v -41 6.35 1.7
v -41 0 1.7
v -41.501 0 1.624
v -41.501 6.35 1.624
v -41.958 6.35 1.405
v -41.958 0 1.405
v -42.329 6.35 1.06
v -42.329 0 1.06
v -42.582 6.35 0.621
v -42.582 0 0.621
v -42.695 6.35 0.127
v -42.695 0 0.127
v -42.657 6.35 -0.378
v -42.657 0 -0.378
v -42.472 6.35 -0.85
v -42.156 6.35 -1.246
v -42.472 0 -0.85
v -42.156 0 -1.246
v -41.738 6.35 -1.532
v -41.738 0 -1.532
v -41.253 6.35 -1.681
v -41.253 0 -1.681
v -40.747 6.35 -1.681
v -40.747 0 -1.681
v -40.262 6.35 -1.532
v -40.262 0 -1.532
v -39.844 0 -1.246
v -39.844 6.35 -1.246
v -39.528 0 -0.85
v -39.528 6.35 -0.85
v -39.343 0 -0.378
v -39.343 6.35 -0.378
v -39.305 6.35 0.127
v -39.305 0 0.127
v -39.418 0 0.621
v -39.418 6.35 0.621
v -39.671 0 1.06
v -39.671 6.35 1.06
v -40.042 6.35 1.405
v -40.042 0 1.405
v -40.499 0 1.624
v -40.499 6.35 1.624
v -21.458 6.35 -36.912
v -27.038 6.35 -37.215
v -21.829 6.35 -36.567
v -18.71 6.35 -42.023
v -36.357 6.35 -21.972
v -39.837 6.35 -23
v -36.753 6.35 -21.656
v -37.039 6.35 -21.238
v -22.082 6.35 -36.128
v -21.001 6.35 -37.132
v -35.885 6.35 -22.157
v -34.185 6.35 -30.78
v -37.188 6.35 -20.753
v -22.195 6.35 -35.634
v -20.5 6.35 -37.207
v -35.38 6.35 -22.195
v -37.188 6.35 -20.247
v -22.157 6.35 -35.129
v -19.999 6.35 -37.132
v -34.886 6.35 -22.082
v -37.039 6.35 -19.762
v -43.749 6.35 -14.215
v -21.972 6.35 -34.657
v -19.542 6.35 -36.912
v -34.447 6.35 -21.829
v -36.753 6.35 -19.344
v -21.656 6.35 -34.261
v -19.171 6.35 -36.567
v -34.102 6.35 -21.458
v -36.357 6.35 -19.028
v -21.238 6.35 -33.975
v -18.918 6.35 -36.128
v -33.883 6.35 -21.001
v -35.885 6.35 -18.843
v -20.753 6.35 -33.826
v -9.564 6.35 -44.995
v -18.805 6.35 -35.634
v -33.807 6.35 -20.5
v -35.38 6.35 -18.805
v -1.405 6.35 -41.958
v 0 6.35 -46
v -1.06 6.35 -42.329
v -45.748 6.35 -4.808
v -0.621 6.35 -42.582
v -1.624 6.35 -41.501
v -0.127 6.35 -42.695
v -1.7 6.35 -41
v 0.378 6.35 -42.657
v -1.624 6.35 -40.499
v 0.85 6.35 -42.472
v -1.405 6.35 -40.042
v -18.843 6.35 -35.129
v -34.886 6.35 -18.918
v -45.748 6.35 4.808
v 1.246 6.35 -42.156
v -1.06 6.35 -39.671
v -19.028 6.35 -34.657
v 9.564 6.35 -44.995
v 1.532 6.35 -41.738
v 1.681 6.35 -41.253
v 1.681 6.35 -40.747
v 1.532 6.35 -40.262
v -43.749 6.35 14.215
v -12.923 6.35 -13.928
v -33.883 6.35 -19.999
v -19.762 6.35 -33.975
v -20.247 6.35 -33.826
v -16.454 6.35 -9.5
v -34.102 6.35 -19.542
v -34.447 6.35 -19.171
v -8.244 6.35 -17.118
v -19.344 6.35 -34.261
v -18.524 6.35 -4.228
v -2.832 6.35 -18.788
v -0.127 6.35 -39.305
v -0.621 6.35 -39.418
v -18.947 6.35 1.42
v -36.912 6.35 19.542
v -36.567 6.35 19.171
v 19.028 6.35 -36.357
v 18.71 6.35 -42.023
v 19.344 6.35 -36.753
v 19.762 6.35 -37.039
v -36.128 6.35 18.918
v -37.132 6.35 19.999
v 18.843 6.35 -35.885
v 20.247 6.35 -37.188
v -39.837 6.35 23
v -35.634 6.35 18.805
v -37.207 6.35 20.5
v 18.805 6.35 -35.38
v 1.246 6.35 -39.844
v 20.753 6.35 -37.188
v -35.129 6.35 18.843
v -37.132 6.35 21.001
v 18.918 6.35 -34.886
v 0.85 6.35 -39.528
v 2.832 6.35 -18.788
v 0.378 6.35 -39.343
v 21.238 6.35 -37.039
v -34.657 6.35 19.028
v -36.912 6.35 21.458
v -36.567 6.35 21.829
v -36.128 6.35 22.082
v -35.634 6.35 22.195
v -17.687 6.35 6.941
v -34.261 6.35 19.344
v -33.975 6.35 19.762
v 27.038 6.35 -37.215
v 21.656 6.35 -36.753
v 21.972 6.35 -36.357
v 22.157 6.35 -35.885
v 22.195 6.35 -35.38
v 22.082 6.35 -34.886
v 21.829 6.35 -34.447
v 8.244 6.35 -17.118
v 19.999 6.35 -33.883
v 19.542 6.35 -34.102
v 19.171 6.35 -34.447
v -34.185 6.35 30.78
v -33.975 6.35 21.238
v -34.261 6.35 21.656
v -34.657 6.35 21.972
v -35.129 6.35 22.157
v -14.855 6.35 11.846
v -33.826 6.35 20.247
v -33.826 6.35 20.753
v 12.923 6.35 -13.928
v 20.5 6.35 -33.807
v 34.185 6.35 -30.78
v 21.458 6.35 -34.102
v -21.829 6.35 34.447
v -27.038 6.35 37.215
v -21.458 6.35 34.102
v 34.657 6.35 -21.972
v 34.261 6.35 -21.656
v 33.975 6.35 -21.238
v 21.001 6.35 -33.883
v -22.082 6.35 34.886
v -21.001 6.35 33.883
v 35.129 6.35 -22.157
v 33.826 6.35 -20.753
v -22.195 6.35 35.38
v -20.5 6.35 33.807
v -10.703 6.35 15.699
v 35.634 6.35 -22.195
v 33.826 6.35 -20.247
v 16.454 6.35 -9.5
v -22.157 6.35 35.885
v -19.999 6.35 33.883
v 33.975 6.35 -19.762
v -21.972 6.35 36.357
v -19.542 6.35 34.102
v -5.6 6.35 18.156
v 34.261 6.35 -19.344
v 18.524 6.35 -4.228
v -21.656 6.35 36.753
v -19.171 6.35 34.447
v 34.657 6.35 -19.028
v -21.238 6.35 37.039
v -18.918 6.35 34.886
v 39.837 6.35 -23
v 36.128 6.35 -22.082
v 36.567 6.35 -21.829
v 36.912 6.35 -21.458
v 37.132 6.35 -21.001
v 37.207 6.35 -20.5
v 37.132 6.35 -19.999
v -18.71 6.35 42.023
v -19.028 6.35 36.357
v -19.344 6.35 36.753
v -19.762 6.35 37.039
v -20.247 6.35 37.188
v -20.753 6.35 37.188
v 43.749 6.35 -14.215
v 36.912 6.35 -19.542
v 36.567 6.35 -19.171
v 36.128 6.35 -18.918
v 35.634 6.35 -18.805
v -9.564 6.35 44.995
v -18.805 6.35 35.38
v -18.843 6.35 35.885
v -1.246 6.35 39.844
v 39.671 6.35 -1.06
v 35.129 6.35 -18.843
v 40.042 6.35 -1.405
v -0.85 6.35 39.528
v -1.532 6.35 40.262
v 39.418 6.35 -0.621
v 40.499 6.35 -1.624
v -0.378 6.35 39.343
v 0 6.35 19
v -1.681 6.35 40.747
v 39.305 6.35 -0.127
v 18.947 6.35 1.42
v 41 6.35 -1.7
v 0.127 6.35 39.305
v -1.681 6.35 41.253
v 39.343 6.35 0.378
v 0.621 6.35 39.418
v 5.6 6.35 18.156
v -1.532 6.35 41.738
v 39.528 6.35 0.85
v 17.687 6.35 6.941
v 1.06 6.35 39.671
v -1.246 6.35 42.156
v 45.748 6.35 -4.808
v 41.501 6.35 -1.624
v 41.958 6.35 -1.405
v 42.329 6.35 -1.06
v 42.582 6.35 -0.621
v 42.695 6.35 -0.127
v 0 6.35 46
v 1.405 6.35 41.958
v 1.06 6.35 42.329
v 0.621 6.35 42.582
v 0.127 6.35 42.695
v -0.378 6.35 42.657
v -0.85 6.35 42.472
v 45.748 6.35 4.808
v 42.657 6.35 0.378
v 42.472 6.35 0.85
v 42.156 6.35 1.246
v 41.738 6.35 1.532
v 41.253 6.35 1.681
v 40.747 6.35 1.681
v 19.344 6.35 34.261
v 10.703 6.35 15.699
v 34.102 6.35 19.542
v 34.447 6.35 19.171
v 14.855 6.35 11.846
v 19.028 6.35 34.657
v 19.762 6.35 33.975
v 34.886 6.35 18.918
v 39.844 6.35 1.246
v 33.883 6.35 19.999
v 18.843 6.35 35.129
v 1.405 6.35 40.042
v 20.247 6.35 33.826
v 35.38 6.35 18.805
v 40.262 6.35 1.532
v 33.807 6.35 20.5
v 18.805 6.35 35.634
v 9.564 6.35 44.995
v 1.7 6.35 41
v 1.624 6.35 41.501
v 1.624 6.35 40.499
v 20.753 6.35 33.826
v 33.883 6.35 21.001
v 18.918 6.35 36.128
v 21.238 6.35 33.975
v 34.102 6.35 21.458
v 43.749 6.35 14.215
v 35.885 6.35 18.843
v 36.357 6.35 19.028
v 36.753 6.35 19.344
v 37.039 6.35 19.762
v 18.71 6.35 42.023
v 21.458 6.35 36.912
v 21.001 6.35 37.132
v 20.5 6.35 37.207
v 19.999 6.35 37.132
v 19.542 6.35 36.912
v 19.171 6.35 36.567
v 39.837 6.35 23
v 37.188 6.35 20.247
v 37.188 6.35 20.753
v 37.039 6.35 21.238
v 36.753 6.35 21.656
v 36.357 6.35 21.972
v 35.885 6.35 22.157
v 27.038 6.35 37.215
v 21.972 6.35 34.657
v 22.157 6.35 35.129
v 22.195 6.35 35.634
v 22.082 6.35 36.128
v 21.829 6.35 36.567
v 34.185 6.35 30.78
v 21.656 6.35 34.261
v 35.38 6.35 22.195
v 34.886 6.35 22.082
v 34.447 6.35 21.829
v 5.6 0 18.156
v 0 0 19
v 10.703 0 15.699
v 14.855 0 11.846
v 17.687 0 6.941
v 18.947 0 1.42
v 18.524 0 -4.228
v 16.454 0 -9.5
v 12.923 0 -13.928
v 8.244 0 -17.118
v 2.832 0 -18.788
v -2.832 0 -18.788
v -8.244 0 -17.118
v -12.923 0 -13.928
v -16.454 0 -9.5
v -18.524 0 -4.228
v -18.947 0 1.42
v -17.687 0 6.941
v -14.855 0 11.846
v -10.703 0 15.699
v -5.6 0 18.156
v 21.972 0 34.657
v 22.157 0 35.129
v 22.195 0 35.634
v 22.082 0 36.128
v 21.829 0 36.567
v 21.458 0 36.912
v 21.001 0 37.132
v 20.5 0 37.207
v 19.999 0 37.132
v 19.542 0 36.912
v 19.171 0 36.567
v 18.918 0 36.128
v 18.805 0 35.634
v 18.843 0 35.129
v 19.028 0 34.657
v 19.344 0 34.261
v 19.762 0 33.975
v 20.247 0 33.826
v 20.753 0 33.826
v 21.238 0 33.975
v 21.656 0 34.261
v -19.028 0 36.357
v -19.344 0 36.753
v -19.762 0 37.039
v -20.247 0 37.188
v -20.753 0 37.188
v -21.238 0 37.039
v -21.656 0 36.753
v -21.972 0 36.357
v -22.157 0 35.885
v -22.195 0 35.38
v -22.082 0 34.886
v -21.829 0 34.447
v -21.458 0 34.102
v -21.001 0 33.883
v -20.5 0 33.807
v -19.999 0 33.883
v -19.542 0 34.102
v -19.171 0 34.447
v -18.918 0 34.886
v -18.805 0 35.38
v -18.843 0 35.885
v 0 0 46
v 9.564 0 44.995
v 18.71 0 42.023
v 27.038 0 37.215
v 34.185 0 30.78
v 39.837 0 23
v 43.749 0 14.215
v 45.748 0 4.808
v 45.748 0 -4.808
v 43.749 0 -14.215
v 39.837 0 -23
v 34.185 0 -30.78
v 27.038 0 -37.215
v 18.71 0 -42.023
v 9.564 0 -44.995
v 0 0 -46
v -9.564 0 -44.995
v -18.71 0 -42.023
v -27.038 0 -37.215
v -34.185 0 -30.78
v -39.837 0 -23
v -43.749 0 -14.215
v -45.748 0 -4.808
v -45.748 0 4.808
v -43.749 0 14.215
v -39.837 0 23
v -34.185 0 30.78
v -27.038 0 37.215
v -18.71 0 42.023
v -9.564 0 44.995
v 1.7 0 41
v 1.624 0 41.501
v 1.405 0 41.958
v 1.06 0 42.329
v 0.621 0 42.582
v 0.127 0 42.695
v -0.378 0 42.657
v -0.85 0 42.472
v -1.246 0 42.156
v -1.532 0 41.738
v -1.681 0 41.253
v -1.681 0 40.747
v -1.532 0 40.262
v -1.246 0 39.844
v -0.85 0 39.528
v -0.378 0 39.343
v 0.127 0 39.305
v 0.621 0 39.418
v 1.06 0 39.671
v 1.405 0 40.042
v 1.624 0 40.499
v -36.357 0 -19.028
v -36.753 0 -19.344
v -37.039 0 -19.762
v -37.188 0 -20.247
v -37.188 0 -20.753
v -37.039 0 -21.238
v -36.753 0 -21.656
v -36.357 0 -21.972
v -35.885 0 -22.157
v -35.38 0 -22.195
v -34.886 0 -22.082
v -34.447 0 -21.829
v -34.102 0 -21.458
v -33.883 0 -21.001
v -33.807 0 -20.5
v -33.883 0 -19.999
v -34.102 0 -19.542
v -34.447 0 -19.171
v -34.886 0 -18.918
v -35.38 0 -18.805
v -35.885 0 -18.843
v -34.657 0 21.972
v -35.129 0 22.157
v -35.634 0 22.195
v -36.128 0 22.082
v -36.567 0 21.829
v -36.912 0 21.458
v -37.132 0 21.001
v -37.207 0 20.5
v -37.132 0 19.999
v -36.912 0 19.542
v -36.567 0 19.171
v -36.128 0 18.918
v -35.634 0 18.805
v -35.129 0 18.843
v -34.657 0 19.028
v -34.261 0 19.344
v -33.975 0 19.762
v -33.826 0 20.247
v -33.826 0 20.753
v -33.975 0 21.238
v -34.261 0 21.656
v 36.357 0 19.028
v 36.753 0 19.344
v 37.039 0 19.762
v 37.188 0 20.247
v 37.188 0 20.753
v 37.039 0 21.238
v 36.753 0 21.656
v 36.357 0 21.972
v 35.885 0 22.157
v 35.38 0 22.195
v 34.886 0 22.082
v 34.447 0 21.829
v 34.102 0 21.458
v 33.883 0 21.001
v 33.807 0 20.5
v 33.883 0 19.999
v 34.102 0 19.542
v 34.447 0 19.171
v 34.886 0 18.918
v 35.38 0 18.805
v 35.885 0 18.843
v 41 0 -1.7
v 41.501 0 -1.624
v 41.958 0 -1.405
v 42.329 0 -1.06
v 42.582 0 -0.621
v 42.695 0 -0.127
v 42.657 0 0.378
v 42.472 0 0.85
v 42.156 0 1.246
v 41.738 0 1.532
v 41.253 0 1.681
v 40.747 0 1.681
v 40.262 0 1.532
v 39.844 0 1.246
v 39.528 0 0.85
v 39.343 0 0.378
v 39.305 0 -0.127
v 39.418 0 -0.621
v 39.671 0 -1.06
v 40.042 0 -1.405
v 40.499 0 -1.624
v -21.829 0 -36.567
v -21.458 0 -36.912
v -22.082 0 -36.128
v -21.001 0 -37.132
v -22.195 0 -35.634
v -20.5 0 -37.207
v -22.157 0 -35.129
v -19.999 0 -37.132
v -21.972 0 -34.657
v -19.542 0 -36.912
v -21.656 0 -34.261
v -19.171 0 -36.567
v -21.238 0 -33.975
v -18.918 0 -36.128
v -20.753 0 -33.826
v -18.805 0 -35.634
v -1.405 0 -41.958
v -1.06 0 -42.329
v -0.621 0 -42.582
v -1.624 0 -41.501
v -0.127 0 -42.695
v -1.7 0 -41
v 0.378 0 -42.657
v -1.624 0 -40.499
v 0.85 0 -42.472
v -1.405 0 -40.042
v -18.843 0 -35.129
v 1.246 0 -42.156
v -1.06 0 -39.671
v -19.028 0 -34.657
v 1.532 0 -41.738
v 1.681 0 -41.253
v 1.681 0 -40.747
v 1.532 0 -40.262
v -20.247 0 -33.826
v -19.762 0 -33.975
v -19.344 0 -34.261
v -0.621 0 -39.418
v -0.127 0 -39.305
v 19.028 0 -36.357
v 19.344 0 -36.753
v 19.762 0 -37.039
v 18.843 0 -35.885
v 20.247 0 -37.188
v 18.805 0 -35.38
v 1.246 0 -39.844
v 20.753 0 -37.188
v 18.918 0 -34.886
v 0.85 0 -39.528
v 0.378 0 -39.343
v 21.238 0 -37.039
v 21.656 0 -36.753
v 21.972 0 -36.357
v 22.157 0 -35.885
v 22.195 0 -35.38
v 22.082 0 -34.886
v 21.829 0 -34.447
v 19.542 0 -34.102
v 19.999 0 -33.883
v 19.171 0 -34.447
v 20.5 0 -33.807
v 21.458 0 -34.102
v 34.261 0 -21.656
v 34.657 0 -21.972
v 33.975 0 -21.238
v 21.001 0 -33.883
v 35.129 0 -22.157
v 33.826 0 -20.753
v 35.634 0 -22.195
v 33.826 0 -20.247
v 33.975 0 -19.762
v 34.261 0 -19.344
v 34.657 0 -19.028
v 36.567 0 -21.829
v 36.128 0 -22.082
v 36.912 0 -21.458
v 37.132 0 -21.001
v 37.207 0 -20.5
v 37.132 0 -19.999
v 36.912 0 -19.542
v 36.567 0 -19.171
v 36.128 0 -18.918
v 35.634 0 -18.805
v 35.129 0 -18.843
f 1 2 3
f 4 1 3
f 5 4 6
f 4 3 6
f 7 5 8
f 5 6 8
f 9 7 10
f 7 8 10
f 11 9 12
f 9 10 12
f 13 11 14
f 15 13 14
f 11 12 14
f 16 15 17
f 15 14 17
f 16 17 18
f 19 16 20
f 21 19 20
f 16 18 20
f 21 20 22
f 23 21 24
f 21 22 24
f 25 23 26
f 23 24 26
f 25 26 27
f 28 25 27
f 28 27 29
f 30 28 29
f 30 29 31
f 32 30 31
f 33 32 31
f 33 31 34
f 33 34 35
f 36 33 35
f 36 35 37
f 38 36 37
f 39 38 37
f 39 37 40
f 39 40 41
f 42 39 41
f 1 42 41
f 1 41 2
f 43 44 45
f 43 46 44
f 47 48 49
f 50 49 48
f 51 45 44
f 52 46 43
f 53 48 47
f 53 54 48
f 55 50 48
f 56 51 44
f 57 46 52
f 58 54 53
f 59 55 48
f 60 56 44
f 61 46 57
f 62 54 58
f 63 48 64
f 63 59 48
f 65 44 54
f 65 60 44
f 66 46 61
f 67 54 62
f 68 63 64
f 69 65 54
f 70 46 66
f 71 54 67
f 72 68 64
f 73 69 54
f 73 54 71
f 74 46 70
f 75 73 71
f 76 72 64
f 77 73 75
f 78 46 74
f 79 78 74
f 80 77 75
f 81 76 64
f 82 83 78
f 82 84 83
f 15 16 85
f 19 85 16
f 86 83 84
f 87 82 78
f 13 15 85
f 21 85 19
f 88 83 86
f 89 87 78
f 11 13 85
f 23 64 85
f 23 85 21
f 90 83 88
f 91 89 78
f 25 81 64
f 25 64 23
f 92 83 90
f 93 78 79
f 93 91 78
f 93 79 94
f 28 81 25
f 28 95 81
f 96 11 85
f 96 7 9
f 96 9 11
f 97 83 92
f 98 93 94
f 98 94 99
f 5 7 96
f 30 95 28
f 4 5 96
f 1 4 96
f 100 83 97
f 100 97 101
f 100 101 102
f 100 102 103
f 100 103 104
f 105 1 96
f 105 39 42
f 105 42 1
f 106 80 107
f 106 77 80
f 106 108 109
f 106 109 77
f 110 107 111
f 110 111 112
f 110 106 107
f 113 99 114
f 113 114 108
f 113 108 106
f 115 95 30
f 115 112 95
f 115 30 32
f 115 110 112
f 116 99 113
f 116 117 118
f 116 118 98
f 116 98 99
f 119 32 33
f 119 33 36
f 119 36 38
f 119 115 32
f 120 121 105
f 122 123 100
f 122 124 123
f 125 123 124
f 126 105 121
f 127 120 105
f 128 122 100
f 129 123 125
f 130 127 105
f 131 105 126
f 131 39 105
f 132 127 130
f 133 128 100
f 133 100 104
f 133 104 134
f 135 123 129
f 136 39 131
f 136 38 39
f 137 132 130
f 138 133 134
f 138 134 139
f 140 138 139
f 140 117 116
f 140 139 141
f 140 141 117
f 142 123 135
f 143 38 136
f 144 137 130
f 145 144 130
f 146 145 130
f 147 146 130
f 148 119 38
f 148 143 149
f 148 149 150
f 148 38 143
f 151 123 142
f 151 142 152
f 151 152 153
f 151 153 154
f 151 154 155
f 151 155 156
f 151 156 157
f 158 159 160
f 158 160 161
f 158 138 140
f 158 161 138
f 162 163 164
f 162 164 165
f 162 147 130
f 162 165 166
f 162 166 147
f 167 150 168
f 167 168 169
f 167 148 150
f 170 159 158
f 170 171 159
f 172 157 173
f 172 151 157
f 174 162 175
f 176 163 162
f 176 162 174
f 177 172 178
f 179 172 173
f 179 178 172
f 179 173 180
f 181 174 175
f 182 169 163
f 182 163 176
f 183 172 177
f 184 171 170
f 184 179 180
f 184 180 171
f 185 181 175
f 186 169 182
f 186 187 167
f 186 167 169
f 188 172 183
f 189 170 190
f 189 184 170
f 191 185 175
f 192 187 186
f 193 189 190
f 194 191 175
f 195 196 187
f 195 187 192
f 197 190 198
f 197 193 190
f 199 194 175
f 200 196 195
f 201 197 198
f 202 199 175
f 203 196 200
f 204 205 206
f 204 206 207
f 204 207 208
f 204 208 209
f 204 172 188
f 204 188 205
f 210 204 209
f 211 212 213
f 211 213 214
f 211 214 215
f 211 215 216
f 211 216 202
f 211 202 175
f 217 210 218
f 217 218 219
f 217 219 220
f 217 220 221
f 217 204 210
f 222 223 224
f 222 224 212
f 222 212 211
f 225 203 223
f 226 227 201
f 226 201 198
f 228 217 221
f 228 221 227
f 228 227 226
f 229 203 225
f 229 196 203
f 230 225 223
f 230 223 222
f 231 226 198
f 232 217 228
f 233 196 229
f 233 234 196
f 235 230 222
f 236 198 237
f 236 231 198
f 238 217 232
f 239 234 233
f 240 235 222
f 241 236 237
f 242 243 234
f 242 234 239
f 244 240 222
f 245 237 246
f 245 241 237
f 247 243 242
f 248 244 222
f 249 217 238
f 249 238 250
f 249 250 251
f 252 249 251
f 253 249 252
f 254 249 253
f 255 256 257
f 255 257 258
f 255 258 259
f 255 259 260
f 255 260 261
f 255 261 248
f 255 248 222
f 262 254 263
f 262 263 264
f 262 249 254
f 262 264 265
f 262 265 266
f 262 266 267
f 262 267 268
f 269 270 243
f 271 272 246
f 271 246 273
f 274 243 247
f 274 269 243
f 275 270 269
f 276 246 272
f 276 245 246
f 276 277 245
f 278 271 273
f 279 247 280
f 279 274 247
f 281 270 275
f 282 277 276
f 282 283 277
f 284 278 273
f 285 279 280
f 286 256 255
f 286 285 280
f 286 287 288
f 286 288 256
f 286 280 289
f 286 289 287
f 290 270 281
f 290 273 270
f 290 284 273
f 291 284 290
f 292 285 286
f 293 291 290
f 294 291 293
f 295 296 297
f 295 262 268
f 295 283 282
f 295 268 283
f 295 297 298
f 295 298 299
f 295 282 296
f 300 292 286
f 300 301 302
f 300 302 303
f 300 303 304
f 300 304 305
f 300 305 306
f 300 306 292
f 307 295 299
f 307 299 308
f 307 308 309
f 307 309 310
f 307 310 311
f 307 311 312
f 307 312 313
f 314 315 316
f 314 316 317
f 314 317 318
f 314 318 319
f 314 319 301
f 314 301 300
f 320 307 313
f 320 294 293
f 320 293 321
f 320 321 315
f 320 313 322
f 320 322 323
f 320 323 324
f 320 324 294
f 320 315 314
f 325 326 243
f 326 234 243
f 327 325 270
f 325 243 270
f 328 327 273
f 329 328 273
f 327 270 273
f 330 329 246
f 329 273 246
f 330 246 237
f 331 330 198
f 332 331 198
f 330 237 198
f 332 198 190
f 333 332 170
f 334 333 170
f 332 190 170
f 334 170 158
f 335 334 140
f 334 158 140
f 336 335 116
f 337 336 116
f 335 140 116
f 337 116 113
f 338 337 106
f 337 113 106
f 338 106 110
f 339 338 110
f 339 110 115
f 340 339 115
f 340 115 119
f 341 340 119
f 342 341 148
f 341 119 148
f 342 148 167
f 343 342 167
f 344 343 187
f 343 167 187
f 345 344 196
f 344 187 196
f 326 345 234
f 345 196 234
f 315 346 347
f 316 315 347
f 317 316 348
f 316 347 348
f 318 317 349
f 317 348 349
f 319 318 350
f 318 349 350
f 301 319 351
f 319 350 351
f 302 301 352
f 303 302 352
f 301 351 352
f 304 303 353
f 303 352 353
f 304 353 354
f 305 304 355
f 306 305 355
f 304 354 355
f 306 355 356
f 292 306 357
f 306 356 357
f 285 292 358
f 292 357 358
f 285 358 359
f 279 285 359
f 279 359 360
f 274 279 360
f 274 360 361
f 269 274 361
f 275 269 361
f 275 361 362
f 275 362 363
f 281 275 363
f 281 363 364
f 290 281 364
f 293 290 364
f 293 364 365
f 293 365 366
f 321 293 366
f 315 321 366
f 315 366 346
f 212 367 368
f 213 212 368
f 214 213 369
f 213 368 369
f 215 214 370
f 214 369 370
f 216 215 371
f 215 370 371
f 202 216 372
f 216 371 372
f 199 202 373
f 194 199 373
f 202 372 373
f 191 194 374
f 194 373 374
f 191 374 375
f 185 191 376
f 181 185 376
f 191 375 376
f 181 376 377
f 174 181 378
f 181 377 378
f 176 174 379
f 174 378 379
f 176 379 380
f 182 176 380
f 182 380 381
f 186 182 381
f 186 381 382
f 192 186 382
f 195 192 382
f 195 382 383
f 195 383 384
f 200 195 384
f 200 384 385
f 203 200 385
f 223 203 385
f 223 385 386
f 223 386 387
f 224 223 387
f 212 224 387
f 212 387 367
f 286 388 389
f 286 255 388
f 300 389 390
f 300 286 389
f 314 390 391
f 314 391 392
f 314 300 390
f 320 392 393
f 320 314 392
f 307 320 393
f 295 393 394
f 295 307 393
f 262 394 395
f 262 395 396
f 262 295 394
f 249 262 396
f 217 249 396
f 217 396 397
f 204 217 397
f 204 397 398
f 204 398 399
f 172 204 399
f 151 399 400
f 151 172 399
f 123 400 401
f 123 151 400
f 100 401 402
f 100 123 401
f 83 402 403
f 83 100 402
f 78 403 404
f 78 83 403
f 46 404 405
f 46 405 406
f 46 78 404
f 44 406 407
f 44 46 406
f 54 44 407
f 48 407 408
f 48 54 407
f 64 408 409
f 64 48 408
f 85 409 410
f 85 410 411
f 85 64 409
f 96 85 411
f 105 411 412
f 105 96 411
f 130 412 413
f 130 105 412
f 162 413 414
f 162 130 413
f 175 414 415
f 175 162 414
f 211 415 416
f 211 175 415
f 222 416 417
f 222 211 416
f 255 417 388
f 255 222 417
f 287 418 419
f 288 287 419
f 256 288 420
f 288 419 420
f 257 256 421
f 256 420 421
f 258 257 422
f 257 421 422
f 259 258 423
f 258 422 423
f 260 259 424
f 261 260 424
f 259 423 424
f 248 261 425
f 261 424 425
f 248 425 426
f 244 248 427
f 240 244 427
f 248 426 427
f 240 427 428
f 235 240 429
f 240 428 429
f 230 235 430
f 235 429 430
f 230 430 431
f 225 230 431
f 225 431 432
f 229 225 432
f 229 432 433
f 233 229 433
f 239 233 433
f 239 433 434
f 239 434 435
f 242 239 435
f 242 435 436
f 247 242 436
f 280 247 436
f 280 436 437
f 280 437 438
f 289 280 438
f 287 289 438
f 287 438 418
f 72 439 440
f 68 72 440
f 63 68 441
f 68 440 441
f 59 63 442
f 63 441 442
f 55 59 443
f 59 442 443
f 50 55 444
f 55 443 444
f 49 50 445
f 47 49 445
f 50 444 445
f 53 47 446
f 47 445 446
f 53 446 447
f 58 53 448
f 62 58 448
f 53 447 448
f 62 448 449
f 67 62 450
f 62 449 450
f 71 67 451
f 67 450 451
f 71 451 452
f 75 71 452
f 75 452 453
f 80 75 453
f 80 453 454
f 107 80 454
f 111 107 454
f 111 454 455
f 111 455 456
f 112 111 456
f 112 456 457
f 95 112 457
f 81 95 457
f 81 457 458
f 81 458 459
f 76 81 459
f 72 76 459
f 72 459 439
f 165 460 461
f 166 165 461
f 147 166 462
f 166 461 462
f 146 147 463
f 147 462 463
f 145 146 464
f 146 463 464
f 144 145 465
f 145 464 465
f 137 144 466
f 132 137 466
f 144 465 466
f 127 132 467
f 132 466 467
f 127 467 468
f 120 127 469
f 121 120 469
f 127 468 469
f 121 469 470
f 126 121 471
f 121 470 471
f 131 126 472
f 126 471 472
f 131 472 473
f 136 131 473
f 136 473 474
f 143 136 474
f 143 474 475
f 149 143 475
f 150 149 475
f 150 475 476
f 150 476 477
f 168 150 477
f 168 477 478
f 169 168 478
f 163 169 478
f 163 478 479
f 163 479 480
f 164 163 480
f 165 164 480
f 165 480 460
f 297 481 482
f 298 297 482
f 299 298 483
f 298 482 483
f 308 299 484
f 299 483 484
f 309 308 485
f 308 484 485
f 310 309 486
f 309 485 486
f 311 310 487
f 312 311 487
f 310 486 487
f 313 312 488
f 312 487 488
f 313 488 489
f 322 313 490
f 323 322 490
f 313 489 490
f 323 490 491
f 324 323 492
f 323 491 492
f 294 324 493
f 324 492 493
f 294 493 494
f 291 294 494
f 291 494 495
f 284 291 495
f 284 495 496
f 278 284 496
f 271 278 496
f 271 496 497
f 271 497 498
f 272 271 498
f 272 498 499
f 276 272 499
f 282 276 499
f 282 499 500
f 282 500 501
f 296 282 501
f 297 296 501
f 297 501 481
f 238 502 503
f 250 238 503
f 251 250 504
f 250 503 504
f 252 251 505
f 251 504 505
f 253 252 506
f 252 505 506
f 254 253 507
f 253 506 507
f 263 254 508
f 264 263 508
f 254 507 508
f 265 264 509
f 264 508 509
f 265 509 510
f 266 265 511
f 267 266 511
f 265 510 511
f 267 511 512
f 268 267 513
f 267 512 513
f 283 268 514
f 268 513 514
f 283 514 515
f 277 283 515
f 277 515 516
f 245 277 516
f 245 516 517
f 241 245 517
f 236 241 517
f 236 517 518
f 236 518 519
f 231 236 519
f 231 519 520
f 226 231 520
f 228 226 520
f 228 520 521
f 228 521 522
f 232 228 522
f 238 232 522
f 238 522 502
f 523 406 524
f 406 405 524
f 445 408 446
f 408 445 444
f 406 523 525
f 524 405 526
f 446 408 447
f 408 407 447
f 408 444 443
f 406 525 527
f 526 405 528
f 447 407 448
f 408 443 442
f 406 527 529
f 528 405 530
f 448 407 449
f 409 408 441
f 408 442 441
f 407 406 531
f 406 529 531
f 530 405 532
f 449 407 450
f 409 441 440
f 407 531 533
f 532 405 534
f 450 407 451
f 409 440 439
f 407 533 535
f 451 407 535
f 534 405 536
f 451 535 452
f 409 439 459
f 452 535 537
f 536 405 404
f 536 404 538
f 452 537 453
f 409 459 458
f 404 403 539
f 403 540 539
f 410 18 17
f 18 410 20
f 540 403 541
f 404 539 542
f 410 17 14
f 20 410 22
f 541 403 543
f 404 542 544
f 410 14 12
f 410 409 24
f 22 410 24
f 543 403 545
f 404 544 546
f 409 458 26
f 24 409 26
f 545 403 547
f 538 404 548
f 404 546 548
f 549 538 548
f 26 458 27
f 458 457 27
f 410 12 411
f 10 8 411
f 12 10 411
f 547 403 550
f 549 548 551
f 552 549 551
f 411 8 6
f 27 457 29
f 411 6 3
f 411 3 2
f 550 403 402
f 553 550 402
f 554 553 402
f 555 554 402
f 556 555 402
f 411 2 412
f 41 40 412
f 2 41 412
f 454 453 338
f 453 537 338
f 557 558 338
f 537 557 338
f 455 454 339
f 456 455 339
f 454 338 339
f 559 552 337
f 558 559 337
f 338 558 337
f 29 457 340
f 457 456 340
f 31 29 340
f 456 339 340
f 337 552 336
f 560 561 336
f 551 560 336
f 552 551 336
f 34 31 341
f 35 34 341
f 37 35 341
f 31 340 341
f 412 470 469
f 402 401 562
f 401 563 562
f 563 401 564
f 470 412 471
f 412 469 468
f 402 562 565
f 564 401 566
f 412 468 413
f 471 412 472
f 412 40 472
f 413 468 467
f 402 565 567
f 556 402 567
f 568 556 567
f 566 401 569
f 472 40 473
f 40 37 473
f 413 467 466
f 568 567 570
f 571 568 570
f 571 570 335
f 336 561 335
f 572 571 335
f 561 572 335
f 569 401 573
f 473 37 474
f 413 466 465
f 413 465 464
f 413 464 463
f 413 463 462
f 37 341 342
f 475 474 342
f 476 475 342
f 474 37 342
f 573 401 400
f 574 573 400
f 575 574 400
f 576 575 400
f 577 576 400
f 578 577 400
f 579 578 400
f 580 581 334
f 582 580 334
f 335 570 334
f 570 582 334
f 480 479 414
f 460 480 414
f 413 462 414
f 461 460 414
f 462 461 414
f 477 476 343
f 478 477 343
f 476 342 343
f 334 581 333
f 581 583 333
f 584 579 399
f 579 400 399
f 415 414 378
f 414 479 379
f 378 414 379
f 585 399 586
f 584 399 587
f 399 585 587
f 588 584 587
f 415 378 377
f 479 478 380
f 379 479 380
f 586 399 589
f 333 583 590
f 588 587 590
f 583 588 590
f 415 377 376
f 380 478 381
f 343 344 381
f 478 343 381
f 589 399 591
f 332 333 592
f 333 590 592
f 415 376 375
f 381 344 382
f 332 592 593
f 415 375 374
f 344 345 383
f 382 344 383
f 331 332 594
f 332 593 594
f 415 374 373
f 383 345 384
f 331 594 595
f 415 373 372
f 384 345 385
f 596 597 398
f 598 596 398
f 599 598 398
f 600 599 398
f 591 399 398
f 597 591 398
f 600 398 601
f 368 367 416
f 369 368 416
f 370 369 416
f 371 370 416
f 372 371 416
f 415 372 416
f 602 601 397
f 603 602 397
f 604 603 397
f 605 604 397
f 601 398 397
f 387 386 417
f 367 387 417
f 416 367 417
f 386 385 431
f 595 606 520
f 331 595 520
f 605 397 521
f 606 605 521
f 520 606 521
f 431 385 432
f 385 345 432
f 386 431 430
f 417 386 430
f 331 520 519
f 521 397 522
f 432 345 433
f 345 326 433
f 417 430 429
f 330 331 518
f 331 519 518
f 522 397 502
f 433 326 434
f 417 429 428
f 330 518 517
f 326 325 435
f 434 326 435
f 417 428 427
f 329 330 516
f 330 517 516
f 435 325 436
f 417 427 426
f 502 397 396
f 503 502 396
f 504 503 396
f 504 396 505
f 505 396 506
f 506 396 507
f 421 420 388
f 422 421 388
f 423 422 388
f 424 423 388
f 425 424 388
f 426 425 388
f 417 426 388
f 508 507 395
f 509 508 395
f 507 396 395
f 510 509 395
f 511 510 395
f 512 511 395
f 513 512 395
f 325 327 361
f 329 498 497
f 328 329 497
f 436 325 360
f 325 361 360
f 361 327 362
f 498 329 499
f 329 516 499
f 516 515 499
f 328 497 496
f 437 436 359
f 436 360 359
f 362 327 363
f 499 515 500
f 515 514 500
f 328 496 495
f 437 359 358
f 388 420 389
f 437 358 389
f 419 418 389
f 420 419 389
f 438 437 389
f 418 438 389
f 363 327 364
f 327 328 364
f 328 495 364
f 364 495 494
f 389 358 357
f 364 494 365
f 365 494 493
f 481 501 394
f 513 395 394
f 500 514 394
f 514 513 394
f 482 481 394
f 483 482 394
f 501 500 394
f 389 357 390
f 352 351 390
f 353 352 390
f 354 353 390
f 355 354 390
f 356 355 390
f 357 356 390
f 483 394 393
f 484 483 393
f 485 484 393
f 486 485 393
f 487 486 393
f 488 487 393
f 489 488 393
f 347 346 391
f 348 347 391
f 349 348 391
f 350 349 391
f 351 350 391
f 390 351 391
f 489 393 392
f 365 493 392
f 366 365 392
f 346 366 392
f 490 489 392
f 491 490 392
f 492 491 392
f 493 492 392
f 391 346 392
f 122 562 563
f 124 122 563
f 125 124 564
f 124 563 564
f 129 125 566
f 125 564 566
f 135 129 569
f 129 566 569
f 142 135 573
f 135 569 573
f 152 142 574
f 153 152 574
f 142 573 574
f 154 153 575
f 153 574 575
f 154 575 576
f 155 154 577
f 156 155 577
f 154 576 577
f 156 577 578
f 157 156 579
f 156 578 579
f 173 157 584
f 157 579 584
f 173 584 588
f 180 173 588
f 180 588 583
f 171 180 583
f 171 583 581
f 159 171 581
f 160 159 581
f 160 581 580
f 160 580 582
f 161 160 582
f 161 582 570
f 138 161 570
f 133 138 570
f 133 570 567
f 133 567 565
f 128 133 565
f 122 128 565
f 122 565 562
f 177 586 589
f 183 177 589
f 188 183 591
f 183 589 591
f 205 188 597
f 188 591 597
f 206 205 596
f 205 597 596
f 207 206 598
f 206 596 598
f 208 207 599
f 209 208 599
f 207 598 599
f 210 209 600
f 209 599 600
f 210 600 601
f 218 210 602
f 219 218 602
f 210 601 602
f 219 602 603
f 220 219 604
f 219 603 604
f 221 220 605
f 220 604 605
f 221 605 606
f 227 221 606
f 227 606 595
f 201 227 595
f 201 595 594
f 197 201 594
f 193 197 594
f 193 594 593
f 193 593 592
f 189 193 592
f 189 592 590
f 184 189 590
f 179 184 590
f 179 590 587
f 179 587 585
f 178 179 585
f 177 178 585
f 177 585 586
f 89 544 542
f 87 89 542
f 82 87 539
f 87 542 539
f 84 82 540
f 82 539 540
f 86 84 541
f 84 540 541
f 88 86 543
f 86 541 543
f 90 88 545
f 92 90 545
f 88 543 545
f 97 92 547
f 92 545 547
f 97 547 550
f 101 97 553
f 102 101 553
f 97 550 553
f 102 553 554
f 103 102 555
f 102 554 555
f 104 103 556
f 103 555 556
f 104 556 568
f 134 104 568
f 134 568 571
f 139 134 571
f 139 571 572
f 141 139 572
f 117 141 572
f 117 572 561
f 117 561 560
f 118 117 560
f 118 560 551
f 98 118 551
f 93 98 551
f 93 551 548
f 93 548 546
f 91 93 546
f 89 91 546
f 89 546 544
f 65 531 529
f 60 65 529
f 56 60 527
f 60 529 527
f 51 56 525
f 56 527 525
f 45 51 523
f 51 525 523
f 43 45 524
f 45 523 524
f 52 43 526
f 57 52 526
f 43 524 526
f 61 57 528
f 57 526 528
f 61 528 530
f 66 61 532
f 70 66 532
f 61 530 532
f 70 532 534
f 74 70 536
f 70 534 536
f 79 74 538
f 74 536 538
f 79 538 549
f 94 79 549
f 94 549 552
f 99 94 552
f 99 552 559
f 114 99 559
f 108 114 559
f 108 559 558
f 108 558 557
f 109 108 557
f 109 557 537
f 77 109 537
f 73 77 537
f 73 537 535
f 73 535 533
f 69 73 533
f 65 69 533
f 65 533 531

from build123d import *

# Parameters (mm, degrees)
SKETCH2_W            = 27
SKETCH2_H            = 6.35
M3_CLEARANCE_HOLE1_D = 3.4
CIRPATTERN1_COUNT    = 12


with BuildPart() as part:
    # Sketch2 → Revolve1 (revolve)
    with BuildSketch(Plane(origin=(0, 0, 0), x_dir=(0, 0, -1), z_dir=(1, 0, 0))):
        with Locations((-32.5, 3.175)):
            Rectangle(SKETCH2_W, SKETCH2_H)
    revolve(axis=Axis((0, 0, 0), (0, 1, 0)))

    # M3 Clearance Hole1 (through all)
    with Locations(Plane(origin=(0, 6.35, 0), x_dir=(1, 0, 0), z_dir=(0, 1, 0))):
        with Locations((0, 41)):
            m3_clearance_hole1 = Hole(M3_CLEARANCE_HOLE1_D / 2)

    # CirPattern1: M3 Clearance Hole1 ×12 about axis
    cirpattern1_axis = Axis((0, 0, 0), (0, 1, 0))
    for i in range(1, CIRPATTERN1_COUNT):
        add(m3_clearance_hole1.rotate(cirpattern1_axis, i * 360 / CIRPATTERN1_COUNT), mode=Mode.SUBTRACT)


solid = part.part
